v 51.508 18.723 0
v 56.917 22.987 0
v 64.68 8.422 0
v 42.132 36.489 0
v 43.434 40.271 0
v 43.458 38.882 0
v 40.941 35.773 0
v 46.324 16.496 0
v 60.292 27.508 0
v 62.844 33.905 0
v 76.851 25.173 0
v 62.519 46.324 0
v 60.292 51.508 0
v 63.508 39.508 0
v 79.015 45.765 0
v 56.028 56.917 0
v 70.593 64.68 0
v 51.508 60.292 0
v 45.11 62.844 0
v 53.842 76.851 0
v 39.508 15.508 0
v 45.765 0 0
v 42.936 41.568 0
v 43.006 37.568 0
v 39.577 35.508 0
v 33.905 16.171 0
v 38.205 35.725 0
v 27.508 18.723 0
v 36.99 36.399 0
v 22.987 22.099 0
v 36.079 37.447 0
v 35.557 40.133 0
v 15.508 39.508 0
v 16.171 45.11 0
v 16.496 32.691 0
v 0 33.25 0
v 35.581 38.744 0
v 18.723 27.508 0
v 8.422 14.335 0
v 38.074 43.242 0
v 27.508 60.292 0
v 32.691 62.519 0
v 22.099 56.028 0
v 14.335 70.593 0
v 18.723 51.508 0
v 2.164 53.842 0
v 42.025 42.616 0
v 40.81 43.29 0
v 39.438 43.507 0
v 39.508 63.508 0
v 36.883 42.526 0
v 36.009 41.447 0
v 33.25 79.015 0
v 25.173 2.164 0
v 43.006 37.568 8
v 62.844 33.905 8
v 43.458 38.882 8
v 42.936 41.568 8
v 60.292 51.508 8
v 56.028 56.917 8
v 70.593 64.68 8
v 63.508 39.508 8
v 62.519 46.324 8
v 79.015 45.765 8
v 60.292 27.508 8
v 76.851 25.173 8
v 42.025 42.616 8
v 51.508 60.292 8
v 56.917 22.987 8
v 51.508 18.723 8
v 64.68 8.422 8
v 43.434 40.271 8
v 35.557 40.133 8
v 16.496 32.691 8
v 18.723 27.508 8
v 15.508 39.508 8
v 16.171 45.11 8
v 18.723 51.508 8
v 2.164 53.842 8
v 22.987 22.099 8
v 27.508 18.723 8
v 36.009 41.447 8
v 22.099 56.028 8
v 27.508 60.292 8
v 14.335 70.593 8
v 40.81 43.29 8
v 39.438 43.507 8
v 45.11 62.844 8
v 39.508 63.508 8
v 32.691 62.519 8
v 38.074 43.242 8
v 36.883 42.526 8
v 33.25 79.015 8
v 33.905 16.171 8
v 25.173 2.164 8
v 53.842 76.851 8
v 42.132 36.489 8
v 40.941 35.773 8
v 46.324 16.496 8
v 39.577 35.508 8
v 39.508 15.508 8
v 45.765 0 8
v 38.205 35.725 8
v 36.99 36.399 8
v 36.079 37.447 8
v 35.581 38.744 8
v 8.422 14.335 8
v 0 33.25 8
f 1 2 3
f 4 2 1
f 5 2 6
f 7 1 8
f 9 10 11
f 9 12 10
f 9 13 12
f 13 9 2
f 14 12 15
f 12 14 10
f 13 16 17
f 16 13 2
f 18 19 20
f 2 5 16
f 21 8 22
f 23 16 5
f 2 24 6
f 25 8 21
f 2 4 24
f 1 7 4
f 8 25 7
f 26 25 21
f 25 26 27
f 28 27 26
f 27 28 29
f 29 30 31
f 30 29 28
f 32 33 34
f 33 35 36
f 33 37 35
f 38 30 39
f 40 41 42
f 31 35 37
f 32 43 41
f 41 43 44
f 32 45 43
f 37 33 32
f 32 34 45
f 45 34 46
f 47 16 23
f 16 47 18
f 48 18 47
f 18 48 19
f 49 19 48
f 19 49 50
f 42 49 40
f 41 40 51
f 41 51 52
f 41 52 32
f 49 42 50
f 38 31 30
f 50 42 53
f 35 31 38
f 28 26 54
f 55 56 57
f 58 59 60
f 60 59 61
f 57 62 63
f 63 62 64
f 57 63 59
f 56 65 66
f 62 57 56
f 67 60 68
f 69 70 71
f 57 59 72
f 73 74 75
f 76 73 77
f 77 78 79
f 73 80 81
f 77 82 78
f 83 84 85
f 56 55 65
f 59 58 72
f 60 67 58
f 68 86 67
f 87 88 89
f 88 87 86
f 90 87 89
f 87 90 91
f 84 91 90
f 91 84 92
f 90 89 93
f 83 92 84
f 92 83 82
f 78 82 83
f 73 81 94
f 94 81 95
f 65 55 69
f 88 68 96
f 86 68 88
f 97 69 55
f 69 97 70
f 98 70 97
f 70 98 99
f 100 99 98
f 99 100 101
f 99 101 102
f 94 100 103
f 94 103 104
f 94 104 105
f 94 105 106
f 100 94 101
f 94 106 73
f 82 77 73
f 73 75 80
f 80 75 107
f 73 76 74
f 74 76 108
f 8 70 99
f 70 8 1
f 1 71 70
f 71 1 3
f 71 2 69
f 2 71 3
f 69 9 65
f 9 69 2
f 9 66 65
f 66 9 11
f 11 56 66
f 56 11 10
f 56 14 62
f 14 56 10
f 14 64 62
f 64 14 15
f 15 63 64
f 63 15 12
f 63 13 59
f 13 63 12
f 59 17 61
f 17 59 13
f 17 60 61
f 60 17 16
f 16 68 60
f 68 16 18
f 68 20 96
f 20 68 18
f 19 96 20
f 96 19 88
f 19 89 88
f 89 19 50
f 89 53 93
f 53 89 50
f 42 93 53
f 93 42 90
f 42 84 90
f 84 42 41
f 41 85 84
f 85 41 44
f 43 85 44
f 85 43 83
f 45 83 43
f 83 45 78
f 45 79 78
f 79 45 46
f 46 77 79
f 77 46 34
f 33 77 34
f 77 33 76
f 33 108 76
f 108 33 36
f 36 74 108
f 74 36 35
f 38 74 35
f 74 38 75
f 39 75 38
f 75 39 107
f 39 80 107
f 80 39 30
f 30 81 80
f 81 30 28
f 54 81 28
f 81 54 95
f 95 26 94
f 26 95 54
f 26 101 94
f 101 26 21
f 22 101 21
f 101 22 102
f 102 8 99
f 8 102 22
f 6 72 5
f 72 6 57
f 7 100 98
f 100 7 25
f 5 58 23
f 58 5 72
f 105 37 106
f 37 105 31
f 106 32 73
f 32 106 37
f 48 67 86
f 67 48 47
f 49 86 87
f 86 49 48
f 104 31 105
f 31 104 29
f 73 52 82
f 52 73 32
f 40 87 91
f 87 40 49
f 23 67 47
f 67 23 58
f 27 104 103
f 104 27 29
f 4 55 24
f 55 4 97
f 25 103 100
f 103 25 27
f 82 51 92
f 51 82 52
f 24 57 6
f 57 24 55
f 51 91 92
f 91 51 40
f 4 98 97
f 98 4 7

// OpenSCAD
$fn = 32;

// ----------------------------------------------------------------------
// Star wheel: 12-point ratchet, R40
// ----------------------------------------------------------------------

// --- parameters (mm) ---
n_points = 12;            // number of points / teeth
r_out = 40;               // tip radius
r_in = 24;                // root radius
bore_r = 4;               // centre bore radius
plate_t = 8;              // plate thickness, Z (extrusion height)
bore_d = 8;               // centre bore diameter

profile = [[15.508, 39.508], [0, 33.25], [16.496, 32.691], [18.723, 27.508], [8.422, 14.335], [22.987, 22.099], [27.508, 18.723], [25.173, 2.164], [33.905, 16.171], [39.508, 15.508], [45.765, 0], [46.324, 16.496], [51.508, 18.723], [64.68, 8.422], [56.917, 22.987], [60.292, 27.508], [76.851, 25.173], [62.844, 33.905], [63.508, 39.508], [79.015, 45.765], [62.519, 46.324], [60.292, 51.508], [70.593, 64.68], [56.028, 56.917], [51.508, 60.292], [53.842, 76.851], [45.11, 62.844], [39.508, 63.508], [33.25, 79.015], [32.691, 62.519], [27.508, 60.292], [14.335, 70.593], [22.099, 56.028], [18.723, 51.508], [2.164, 53.842], [16.171, 45.11]];  // primary outline, 36 points, counter clockwise
void_1 = [[43.434, 40.271], [42.936, 41.568], [42.025, 42.616], [40.81, 43.29], [39.438, 43.507], [38.074, 43.242], [36.883, 42.526], [36.009, 41.447], [35.557, 40.133], [35.581, 38.744], [36.079, 37.447], [36.99, 36.399], [38.205, 35.725], [39.577, 35.508], [40.941, 35.773], [42.132, 36.489], [43.006, 37.568], [43.458, 38.882]];  // centre bore, 18 points

// --- the one profile operation ---
difference() {
  linear_extrude(height = plate_t) polygon(points = profile);
  translate([0, 0, -1])
    linear_extrude(height = plate_t + 2) polygon(points = void_1);
}
